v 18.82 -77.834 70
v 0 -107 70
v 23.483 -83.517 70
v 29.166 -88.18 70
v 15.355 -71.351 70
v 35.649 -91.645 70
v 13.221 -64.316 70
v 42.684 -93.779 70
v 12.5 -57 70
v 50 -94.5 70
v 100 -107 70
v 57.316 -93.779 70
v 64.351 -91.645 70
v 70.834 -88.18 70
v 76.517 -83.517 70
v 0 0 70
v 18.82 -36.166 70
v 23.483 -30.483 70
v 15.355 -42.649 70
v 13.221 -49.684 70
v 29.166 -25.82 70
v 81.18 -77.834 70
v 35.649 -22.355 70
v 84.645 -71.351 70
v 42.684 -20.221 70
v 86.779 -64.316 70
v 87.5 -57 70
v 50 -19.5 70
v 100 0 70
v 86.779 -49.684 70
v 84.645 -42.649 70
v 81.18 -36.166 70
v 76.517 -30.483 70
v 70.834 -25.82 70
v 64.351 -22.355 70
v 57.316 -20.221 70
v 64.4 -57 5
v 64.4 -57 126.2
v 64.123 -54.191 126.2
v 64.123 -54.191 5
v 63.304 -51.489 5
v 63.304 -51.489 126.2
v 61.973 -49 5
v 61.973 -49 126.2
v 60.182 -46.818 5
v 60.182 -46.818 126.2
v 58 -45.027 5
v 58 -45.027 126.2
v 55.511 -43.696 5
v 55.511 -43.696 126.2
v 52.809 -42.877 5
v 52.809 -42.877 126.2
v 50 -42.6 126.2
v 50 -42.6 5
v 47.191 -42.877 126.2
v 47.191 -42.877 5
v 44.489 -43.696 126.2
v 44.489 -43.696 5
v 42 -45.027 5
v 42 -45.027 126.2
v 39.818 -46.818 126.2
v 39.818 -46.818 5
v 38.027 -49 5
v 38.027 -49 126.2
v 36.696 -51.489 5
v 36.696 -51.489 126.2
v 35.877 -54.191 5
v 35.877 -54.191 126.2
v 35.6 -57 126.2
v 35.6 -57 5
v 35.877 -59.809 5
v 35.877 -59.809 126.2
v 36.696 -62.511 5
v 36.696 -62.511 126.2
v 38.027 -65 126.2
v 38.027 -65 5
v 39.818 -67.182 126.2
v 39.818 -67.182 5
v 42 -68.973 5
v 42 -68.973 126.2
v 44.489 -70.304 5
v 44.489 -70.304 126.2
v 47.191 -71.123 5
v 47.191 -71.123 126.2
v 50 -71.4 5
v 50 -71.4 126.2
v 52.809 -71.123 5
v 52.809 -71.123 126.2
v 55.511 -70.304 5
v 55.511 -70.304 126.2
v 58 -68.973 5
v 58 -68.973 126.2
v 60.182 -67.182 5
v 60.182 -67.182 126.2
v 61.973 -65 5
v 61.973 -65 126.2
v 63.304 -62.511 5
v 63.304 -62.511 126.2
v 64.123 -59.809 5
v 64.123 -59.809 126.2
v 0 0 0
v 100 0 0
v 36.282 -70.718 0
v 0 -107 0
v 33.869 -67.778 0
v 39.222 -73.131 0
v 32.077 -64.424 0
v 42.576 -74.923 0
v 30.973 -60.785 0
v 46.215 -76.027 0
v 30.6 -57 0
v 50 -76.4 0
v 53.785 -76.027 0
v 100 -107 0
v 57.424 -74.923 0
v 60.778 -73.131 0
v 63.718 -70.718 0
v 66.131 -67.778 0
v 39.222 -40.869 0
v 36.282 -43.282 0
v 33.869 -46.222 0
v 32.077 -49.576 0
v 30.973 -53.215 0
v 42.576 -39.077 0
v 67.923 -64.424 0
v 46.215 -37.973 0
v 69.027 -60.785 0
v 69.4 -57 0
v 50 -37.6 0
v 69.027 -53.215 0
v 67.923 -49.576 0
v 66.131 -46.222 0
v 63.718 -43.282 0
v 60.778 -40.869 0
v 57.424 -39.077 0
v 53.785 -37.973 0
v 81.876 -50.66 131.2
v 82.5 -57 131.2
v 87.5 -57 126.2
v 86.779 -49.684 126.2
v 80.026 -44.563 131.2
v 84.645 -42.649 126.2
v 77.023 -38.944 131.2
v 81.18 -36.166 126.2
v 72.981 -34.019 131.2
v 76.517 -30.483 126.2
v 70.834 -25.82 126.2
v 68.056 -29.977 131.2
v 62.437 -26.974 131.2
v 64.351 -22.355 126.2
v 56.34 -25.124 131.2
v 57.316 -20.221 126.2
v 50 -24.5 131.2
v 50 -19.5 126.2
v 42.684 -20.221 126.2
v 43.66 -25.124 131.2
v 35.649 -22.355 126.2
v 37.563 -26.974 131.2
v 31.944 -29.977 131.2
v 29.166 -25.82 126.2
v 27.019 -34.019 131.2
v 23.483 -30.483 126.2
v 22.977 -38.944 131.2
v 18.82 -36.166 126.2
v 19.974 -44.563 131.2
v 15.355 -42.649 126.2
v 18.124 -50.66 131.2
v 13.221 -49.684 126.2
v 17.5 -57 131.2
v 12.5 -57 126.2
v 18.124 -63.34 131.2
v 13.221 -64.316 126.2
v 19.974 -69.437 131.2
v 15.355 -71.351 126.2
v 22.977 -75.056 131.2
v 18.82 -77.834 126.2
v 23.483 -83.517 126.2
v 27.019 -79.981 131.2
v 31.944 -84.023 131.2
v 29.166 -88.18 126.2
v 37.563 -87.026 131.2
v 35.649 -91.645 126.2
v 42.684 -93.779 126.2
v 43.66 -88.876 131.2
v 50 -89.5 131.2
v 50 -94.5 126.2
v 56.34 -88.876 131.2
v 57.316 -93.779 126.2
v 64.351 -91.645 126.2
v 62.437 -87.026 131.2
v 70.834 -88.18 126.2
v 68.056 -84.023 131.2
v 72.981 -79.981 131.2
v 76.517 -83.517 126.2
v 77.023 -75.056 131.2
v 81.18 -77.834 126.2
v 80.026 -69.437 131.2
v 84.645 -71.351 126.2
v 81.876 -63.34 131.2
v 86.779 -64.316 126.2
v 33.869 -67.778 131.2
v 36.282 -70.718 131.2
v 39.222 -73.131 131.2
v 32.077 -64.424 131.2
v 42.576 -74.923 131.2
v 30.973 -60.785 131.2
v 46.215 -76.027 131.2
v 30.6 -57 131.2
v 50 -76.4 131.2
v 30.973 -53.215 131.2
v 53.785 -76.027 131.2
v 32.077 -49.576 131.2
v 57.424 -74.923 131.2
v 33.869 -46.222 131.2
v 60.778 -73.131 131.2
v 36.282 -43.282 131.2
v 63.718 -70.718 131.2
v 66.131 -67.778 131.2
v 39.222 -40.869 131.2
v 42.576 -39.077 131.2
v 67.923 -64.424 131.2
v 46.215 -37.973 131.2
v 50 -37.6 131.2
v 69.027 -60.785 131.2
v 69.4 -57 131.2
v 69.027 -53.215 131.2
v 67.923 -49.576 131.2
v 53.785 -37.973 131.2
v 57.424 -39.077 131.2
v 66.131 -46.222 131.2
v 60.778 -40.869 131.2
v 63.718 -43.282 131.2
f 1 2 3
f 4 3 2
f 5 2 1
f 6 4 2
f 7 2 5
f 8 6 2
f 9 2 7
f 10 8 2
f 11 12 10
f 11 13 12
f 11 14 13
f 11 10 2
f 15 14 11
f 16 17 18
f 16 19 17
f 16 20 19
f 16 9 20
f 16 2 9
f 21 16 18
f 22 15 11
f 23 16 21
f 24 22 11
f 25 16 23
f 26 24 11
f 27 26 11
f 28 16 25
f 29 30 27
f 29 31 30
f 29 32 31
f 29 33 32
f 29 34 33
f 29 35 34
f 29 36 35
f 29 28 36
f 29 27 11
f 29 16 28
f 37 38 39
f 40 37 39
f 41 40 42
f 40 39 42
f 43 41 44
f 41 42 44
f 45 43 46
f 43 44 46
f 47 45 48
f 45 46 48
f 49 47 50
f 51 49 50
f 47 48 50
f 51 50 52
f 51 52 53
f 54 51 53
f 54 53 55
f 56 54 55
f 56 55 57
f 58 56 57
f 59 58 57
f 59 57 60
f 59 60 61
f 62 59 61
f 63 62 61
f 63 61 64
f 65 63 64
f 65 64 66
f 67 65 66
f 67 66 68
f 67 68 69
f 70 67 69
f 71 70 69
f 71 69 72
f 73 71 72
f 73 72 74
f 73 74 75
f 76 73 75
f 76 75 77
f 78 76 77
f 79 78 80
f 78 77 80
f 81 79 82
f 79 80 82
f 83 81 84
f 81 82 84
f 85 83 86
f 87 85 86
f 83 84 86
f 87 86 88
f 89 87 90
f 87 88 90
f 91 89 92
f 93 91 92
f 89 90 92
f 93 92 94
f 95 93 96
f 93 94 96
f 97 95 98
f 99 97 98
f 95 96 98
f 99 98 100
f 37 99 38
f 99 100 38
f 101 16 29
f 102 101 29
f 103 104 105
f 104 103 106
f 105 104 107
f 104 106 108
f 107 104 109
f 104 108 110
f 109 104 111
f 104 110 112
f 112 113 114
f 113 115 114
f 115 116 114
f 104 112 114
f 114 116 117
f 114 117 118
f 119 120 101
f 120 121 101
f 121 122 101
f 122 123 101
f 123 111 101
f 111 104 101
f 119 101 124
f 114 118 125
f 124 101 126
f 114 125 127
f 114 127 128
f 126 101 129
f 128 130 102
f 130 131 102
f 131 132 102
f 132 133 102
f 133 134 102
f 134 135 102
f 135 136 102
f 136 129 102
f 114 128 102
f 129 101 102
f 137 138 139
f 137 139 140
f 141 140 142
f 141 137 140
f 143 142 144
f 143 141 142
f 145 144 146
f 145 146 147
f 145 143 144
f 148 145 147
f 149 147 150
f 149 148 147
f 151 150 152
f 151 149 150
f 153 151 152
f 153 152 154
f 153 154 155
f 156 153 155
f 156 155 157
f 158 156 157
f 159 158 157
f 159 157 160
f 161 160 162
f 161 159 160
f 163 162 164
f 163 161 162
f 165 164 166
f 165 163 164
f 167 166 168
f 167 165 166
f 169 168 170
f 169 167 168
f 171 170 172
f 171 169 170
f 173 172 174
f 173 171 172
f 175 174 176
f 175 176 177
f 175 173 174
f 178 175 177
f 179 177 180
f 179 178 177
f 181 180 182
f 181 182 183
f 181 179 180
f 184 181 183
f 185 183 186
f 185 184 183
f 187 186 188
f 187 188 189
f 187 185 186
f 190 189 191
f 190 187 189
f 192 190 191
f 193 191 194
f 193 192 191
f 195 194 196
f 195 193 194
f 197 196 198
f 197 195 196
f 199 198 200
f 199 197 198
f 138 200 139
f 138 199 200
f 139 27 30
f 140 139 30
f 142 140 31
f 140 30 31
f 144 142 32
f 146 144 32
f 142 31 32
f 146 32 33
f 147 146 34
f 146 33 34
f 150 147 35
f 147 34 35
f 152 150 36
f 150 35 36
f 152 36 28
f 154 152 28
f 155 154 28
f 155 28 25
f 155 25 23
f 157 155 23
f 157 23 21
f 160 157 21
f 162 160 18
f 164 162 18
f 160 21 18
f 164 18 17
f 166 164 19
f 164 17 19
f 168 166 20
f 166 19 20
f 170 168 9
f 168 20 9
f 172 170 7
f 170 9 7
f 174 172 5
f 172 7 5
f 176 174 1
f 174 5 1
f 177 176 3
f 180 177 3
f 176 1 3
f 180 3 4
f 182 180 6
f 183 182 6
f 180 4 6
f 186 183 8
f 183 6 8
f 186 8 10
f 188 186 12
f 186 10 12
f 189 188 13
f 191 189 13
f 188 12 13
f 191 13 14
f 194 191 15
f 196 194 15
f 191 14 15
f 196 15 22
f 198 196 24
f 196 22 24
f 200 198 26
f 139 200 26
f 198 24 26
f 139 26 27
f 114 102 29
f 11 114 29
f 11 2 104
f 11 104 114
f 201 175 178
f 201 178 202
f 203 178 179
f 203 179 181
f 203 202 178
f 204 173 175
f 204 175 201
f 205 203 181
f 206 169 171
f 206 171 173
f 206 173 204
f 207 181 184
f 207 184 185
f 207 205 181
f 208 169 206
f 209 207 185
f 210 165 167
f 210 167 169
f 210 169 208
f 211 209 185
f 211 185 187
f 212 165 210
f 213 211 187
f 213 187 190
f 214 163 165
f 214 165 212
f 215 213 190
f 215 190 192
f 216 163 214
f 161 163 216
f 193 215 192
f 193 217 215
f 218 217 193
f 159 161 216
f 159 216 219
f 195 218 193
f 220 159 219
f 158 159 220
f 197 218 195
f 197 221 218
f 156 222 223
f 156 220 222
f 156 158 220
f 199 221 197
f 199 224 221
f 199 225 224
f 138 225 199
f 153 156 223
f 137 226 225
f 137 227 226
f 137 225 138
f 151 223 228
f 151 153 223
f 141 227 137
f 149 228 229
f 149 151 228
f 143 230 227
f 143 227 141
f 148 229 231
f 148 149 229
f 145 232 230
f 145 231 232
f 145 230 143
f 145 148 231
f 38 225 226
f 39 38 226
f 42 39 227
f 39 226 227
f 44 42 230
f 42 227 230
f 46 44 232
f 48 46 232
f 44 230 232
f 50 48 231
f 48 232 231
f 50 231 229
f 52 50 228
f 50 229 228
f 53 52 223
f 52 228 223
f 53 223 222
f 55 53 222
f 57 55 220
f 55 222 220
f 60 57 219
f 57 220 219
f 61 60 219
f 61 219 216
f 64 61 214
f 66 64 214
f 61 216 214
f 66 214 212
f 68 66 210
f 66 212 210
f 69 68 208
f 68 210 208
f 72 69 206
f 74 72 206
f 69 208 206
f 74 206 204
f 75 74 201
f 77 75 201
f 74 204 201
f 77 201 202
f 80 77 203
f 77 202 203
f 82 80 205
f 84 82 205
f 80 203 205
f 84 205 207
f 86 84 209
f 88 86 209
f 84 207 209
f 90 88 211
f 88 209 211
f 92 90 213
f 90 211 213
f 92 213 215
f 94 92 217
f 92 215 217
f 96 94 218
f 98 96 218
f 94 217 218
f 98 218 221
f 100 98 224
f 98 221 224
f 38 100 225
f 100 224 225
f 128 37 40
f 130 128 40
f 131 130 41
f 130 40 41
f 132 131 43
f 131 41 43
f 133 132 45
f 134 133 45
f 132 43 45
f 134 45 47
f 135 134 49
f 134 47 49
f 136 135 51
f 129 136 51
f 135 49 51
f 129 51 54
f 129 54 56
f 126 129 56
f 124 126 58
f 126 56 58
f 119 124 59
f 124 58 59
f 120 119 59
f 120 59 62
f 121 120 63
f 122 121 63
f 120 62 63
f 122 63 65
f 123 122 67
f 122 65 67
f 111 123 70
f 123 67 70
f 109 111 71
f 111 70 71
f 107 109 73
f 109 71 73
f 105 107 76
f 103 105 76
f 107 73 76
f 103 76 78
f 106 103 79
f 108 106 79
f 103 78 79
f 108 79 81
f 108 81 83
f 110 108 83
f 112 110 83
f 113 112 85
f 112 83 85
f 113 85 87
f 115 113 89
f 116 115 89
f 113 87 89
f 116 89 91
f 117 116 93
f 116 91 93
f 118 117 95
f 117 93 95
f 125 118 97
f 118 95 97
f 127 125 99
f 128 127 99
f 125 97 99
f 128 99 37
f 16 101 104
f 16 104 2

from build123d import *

# Parameters (mm, degrees)
F0_W     = 100
F0_H     = 70
F1_DEPTH = 107
F2_R     = 37.5
F3_DEPTH = 61.2
F4_R     = 14.4000008702
F5_DEPTH = 131.201
F6_SIZE  = 5


with BuildPart() as f1:
    # F0 (on Front) → F1 (new body)
    with BuildSketch(Plane.XZ):
        with Locations((50, 35)):
            Rectangle(F0_W, F0_H)
    extrude(amount=F1_DEPTH)

    # F2 (on face) → F3 (join)
    with BuildSketch(Plane.XY.offset(70)):
        with Locations((50, -57)):
            Circle(F2_R)
    extrude(amount=F3_DEPTH)

    # F4 (on face) → F5 (cut, through all)
    with BuildSketch(Plane.XY.offset(131.2)):
        with Locations((50, -57)):
            Circle(F4_R)
    extrude(amount=-F5_DEPTH, mode=Mode.SUBTRACT)

    # F6
    f6_edges = [f1.edges().sort_by_distance(p)[0] for p in [
        (12.5, -57, 131.2),
        (35.599999, -57, 131.2),
        (35.599999, -57, 0),
    ]]
    chamfer(f6_edges, length=F6_SIZE)


solid = f1.part
